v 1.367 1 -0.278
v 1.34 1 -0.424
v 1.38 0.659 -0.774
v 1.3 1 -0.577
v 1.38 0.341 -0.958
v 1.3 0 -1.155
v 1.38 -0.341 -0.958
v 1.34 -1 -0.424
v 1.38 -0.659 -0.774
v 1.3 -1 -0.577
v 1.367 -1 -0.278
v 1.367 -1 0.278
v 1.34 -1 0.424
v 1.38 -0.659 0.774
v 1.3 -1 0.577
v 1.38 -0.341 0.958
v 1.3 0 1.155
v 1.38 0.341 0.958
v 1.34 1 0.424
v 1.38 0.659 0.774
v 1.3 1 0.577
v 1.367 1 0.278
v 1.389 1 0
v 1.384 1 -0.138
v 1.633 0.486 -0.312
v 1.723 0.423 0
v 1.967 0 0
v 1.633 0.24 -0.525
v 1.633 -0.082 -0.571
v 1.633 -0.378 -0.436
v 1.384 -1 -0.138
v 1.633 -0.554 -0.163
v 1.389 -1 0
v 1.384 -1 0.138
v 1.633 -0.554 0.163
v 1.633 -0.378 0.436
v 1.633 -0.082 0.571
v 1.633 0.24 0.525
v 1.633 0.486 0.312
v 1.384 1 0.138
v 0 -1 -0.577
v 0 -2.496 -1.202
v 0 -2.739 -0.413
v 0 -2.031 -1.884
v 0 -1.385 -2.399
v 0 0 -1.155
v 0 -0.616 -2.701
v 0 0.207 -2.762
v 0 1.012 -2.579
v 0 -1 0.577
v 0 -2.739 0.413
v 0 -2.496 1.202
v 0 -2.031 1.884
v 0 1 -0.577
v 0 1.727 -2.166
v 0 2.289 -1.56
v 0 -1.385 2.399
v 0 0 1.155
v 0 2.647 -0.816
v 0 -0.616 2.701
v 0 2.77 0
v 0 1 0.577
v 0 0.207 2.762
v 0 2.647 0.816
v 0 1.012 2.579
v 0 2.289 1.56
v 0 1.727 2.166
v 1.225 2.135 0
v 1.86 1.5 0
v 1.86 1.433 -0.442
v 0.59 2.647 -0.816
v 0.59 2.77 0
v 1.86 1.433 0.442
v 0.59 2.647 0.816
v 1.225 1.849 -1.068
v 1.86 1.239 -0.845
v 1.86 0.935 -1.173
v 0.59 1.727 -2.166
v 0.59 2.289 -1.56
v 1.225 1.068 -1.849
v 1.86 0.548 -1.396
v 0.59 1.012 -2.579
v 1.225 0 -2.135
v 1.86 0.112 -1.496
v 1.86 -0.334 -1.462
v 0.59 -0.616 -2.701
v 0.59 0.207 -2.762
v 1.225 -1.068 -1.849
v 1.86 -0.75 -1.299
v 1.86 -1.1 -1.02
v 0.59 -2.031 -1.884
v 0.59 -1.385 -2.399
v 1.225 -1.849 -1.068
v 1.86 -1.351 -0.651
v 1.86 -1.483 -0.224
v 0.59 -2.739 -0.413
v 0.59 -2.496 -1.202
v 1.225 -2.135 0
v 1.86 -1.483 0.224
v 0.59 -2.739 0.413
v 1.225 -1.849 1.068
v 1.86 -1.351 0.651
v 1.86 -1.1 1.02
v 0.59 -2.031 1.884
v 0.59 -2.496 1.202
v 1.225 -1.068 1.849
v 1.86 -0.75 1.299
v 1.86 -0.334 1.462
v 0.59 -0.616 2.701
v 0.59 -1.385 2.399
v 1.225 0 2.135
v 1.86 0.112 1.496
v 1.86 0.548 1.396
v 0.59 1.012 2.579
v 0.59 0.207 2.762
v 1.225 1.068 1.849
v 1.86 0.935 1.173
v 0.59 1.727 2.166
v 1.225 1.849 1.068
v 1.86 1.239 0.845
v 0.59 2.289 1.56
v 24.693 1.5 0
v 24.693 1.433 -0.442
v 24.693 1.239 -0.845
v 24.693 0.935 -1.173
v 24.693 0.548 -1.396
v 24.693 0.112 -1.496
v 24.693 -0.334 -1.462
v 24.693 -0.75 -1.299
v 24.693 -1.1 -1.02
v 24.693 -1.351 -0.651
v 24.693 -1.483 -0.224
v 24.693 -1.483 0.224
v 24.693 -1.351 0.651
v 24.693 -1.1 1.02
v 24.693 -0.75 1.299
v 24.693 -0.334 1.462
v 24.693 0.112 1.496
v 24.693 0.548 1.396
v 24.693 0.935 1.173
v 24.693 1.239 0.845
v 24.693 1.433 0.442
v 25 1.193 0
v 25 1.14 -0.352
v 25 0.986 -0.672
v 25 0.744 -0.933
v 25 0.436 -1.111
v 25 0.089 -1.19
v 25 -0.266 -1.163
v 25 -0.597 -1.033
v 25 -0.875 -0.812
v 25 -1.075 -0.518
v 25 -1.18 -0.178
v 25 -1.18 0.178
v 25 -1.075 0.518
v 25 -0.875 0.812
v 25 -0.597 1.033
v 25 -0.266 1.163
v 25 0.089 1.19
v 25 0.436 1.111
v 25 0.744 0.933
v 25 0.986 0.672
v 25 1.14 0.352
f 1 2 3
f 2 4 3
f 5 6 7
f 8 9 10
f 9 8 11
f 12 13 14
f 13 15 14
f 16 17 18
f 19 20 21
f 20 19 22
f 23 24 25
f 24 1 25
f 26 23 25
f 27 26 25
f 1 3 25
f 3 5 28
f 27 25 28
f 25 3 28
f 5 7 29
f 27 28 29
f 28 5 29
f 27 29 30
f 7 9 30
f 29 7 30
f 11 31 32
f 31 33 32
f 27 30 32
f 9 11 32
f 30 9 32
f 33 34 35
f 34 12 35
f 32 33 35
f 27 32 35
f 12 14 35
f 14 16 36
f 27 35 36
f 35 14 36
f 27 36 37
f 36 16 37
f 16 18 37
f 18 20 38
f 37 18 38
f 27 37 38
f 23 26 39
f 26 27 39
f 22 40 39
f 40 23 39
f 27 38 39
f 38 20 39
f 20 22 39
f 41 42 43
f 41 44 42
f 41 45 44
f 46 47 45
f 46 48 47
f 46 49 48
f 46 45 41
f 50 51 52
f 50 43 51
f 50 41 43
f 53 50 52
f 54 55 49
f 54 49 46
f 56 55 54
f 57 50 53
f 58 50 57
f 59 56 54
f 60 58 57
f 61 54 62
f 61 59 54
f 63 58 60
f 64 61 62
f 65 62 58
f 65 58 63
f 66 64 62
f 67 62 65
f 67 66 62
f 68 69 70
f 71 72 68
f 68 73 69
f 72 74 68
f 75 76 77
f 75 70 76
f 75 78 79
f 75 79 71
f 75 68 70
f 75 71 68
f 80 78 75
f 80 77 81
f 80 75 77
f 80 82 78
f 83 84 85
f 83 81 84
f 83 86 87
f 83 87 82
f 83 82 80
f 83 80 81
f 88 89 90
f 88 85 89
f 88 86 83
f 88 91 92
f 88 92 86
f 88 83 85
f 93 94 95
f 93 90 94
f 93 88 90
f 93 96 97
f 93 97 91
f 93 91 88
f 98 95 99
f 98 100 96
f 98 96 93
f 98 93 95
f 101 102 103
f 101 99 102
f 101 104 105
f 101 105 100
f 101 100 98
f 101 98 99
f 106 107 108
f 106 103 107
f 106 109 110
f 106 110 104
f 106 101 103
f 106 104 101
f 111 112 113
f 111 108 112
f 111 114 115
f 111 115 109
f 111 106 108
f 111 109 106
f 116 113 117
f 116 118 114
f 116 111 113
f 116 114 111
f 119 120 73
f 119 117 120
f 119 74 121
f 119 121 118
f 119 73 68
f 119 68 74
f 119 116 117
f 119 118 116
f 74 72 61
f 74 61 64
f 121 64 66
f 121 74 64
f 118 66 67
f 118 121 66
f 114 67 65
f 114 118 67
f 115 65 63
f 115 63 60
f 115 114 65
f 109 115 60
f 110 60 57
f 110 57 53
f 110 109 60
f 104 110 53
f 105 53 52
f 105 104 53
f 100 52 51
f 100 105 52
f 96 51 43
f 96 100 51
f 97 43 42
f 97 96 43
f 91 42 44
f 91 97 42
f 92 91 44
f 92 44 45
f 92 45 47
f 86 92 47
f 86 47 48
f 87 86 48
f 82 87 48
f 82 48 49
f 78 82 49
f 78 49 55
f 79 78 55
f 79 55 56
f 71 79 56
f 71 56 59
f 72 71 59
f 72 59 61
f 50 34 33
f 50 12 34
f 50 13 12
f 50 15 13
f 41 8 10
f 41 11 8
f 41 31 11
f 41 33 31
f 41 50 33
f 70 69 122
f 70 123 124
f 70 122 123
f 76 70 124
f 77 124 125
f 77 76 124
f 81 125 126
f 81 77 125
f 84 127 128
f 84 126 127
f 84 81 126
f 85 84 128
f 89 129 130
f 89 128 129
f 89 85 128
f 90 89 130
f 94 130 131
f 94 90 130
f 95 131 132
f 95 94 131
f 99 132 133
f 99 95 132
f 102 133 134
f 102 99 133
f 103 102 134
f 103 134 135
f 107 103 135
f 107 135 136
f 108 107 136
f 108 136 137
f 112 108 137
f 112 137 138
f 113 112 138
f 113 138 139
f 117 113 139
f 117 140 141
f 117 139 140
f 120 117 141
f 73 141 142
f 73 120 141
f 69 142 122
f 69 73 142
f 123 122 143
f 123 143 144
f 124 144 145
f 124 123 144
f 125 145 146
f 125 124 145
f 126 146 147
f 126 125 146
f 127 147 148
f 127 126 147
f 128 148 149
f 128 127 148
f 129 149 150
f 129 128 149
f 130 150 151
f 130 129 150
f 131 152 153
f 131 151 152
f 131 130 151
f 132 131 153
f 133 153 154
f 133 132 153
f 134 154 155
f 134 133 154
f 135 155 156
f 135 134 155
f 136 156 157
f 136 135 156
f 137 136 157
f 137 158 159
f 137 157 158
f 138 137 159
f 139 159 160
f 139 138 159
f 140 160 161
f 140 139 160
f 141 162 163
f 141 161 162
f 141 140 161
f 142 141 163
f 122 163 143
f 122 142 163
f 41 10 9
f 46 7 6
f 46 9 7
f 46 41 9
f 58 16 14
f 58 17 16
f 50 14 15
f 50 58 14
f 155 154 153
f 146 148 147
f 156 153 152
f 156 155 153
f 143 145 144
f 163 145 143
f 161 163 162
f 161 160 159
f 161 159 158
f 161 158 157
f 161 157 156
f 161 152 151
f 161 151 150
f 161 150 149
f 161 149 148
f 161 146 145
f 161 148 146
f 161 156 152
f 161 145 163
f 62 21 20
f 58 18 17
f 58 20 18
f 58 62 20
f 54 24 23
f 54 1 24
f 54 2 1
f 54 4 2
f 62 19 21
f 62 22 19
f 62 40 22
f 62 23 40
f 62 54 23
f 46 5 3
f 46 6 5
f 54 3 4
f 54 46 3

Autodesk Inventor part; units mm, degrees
ref_plane "YZ Plane" through (0, 0, 0) normal (1, 0, 0) x (0, 1, 0)
ref_plane "XZ Plane" through (0, 0, 0) normal (0, 1, 0) x (-1, 0, 0)
sketch "Esquisse1" plane through (0, 0, 0) normal (0, 0, 1) x (1, 0, 0)
  line L0 (25, 0) -> (25, 1.5)
  line L1 (25, 1.5) -> (7, 1.5)
  line L2 (7, 1.5) -> (6.6933, 1.5)
  line L3 (0, 2.77) -> (0, 1.1547)
  line L4 (0, 1.1547) -> (1.3, 1.1547)
  line L5 (1.3, 1.1547) -> (1.9667, 0)
  line L6 (1.9667, 0) -> (25, 0)
  line L7 (0, 2.77) -> (0.59, 2.77)
  line L8 (0.59, 2.77) -> (1.86, 1.5)
  line L9 (6.6933, 1.5) -> (1.86, 1.5)
  line L10 (7, 1.5) -> (1.86, 1.5) construction
  line L11 (1.86, 1.5) -> (1.86, 1.5)
  line L12 (-5, 0) -> (30, 0) projected
  line L13 (0, -0.554) -> (0, 3.324) projected
  dimension "d0" = 25
  dimension "d1" = 18
  dimension "d2" = 1.3
  dimension "d3" = 3
  dimension "d6" = 1.86
  dimension "d7" = 45
  dimension "d8" = 2.3094
  dimension "d9" = 60
  dimension "d10" = 5.54
  dimension "d11" = 3
  dimension "d12" = 0.3067
revolve "Corps" add sketch "Esquisse1" angle 360 about axis through (1.9667, 0, 0) along (1, 0, 0) contours L6 L5 L4 L3 L7 L8 L9 L2 L1 L0
sketch "Esquisse2" plane through (0, 0, 0) normal (-1, 0, 0) x (0, 0, 1)
  circle A0 centre (0, 0) radius 1.1547 projected
  line L0 (0, -3.878) -> (0, 3.878) projected
  line L1 (-3.878, 0) -> (3.878, 0) projected
  line L2 (1.1547, 0) -> (0.5774, -1)
  line L3 (0.5774, -1) -> (-0.5774, -1)
  line L4 (-0.5774, -1) -> (-1.1547, 0)
  line L5 (-1.1547, 0) -> (-0.5774, 1)
  line L6 (-0.5774, 1) -> (0.5774, 1)
  line L7 (0.5774, 1) -> (1.1547, 0)
  point P0 (0, 1.1547)
extrude "Rainure" add sketch "Esquisse2" against normal up to next contours L7 A0 | A0 L2 | L6 L0 A0 | A0 L0 L3 | L0 L6 A0 | A0 L3 L0 | L4 A0 | A0 L5
thread "Filetage" size "M3x0.5" class "6g" standard "ISO Metric profile" length 18
chamfer "Chanfrein1" distance 0.3067 distance2 0.3067 1 edges at (25, -1.5, 0) measured on face at (25, 0.0871, 0.3876)
ref_plane "Work Plane1" through (104.775, 0, 0) normal (0, 0, -1) x (1, 0, 0)
equation "\"d15\" = GEL"
equation "\"d17\" = -0.5 * SPD + 0.5 * GD"
equation "\"d18\" = GUL"
equation "\"d0\" = NLG"
equation "\"d1\" = GEL"
equation "\"d2\" = INTI"
equation "\"d3\" = GD"
equation "\"d6\" = KOH"
equation "\"d7\" = 0.5 * SEWI"
equation "\"d8\" = 1.1547 * SW"
equation "\"d10\" = KOD"
equation "\"d11\" = BDM"
equation "\"d12\" = GAL"
equation "\"NLG\" = 25"
equation "\"INTI\" = 1.3"
equation "\"GEL\" = 18"
equation "\"GAL\" = 0.61345 * PTC"
equation "\"KOH\" = 1.86"
equation "\"KOD\" = 5.54"
equation "\"GUL\" = 0.61345 * PTC"
equation "\"SPD\" = NND - 1.2269 * PTC"
equation "\"BDM\" = NND"
equation "\"GD\" = NND"
equation "\"SEWI\" = 90deg"
equation "\"SW\" = 2"
equation "\"TOA\" = 30deg"
equation "\"GD1\" = THREADDIA - 1.2269 * PTC"
equation "\"EPV\" = 3.36"
equation "\"THREADDIA\" = 3"
equation "\"PTC\" = 0.5"
equation "\"NND\" = 3"
equation "\"E0\" = 2.31"
equation "\"THREADDESC\" = 1.2345"
properties part number "ISO 10642 - M3 x  25" material "Acier"
